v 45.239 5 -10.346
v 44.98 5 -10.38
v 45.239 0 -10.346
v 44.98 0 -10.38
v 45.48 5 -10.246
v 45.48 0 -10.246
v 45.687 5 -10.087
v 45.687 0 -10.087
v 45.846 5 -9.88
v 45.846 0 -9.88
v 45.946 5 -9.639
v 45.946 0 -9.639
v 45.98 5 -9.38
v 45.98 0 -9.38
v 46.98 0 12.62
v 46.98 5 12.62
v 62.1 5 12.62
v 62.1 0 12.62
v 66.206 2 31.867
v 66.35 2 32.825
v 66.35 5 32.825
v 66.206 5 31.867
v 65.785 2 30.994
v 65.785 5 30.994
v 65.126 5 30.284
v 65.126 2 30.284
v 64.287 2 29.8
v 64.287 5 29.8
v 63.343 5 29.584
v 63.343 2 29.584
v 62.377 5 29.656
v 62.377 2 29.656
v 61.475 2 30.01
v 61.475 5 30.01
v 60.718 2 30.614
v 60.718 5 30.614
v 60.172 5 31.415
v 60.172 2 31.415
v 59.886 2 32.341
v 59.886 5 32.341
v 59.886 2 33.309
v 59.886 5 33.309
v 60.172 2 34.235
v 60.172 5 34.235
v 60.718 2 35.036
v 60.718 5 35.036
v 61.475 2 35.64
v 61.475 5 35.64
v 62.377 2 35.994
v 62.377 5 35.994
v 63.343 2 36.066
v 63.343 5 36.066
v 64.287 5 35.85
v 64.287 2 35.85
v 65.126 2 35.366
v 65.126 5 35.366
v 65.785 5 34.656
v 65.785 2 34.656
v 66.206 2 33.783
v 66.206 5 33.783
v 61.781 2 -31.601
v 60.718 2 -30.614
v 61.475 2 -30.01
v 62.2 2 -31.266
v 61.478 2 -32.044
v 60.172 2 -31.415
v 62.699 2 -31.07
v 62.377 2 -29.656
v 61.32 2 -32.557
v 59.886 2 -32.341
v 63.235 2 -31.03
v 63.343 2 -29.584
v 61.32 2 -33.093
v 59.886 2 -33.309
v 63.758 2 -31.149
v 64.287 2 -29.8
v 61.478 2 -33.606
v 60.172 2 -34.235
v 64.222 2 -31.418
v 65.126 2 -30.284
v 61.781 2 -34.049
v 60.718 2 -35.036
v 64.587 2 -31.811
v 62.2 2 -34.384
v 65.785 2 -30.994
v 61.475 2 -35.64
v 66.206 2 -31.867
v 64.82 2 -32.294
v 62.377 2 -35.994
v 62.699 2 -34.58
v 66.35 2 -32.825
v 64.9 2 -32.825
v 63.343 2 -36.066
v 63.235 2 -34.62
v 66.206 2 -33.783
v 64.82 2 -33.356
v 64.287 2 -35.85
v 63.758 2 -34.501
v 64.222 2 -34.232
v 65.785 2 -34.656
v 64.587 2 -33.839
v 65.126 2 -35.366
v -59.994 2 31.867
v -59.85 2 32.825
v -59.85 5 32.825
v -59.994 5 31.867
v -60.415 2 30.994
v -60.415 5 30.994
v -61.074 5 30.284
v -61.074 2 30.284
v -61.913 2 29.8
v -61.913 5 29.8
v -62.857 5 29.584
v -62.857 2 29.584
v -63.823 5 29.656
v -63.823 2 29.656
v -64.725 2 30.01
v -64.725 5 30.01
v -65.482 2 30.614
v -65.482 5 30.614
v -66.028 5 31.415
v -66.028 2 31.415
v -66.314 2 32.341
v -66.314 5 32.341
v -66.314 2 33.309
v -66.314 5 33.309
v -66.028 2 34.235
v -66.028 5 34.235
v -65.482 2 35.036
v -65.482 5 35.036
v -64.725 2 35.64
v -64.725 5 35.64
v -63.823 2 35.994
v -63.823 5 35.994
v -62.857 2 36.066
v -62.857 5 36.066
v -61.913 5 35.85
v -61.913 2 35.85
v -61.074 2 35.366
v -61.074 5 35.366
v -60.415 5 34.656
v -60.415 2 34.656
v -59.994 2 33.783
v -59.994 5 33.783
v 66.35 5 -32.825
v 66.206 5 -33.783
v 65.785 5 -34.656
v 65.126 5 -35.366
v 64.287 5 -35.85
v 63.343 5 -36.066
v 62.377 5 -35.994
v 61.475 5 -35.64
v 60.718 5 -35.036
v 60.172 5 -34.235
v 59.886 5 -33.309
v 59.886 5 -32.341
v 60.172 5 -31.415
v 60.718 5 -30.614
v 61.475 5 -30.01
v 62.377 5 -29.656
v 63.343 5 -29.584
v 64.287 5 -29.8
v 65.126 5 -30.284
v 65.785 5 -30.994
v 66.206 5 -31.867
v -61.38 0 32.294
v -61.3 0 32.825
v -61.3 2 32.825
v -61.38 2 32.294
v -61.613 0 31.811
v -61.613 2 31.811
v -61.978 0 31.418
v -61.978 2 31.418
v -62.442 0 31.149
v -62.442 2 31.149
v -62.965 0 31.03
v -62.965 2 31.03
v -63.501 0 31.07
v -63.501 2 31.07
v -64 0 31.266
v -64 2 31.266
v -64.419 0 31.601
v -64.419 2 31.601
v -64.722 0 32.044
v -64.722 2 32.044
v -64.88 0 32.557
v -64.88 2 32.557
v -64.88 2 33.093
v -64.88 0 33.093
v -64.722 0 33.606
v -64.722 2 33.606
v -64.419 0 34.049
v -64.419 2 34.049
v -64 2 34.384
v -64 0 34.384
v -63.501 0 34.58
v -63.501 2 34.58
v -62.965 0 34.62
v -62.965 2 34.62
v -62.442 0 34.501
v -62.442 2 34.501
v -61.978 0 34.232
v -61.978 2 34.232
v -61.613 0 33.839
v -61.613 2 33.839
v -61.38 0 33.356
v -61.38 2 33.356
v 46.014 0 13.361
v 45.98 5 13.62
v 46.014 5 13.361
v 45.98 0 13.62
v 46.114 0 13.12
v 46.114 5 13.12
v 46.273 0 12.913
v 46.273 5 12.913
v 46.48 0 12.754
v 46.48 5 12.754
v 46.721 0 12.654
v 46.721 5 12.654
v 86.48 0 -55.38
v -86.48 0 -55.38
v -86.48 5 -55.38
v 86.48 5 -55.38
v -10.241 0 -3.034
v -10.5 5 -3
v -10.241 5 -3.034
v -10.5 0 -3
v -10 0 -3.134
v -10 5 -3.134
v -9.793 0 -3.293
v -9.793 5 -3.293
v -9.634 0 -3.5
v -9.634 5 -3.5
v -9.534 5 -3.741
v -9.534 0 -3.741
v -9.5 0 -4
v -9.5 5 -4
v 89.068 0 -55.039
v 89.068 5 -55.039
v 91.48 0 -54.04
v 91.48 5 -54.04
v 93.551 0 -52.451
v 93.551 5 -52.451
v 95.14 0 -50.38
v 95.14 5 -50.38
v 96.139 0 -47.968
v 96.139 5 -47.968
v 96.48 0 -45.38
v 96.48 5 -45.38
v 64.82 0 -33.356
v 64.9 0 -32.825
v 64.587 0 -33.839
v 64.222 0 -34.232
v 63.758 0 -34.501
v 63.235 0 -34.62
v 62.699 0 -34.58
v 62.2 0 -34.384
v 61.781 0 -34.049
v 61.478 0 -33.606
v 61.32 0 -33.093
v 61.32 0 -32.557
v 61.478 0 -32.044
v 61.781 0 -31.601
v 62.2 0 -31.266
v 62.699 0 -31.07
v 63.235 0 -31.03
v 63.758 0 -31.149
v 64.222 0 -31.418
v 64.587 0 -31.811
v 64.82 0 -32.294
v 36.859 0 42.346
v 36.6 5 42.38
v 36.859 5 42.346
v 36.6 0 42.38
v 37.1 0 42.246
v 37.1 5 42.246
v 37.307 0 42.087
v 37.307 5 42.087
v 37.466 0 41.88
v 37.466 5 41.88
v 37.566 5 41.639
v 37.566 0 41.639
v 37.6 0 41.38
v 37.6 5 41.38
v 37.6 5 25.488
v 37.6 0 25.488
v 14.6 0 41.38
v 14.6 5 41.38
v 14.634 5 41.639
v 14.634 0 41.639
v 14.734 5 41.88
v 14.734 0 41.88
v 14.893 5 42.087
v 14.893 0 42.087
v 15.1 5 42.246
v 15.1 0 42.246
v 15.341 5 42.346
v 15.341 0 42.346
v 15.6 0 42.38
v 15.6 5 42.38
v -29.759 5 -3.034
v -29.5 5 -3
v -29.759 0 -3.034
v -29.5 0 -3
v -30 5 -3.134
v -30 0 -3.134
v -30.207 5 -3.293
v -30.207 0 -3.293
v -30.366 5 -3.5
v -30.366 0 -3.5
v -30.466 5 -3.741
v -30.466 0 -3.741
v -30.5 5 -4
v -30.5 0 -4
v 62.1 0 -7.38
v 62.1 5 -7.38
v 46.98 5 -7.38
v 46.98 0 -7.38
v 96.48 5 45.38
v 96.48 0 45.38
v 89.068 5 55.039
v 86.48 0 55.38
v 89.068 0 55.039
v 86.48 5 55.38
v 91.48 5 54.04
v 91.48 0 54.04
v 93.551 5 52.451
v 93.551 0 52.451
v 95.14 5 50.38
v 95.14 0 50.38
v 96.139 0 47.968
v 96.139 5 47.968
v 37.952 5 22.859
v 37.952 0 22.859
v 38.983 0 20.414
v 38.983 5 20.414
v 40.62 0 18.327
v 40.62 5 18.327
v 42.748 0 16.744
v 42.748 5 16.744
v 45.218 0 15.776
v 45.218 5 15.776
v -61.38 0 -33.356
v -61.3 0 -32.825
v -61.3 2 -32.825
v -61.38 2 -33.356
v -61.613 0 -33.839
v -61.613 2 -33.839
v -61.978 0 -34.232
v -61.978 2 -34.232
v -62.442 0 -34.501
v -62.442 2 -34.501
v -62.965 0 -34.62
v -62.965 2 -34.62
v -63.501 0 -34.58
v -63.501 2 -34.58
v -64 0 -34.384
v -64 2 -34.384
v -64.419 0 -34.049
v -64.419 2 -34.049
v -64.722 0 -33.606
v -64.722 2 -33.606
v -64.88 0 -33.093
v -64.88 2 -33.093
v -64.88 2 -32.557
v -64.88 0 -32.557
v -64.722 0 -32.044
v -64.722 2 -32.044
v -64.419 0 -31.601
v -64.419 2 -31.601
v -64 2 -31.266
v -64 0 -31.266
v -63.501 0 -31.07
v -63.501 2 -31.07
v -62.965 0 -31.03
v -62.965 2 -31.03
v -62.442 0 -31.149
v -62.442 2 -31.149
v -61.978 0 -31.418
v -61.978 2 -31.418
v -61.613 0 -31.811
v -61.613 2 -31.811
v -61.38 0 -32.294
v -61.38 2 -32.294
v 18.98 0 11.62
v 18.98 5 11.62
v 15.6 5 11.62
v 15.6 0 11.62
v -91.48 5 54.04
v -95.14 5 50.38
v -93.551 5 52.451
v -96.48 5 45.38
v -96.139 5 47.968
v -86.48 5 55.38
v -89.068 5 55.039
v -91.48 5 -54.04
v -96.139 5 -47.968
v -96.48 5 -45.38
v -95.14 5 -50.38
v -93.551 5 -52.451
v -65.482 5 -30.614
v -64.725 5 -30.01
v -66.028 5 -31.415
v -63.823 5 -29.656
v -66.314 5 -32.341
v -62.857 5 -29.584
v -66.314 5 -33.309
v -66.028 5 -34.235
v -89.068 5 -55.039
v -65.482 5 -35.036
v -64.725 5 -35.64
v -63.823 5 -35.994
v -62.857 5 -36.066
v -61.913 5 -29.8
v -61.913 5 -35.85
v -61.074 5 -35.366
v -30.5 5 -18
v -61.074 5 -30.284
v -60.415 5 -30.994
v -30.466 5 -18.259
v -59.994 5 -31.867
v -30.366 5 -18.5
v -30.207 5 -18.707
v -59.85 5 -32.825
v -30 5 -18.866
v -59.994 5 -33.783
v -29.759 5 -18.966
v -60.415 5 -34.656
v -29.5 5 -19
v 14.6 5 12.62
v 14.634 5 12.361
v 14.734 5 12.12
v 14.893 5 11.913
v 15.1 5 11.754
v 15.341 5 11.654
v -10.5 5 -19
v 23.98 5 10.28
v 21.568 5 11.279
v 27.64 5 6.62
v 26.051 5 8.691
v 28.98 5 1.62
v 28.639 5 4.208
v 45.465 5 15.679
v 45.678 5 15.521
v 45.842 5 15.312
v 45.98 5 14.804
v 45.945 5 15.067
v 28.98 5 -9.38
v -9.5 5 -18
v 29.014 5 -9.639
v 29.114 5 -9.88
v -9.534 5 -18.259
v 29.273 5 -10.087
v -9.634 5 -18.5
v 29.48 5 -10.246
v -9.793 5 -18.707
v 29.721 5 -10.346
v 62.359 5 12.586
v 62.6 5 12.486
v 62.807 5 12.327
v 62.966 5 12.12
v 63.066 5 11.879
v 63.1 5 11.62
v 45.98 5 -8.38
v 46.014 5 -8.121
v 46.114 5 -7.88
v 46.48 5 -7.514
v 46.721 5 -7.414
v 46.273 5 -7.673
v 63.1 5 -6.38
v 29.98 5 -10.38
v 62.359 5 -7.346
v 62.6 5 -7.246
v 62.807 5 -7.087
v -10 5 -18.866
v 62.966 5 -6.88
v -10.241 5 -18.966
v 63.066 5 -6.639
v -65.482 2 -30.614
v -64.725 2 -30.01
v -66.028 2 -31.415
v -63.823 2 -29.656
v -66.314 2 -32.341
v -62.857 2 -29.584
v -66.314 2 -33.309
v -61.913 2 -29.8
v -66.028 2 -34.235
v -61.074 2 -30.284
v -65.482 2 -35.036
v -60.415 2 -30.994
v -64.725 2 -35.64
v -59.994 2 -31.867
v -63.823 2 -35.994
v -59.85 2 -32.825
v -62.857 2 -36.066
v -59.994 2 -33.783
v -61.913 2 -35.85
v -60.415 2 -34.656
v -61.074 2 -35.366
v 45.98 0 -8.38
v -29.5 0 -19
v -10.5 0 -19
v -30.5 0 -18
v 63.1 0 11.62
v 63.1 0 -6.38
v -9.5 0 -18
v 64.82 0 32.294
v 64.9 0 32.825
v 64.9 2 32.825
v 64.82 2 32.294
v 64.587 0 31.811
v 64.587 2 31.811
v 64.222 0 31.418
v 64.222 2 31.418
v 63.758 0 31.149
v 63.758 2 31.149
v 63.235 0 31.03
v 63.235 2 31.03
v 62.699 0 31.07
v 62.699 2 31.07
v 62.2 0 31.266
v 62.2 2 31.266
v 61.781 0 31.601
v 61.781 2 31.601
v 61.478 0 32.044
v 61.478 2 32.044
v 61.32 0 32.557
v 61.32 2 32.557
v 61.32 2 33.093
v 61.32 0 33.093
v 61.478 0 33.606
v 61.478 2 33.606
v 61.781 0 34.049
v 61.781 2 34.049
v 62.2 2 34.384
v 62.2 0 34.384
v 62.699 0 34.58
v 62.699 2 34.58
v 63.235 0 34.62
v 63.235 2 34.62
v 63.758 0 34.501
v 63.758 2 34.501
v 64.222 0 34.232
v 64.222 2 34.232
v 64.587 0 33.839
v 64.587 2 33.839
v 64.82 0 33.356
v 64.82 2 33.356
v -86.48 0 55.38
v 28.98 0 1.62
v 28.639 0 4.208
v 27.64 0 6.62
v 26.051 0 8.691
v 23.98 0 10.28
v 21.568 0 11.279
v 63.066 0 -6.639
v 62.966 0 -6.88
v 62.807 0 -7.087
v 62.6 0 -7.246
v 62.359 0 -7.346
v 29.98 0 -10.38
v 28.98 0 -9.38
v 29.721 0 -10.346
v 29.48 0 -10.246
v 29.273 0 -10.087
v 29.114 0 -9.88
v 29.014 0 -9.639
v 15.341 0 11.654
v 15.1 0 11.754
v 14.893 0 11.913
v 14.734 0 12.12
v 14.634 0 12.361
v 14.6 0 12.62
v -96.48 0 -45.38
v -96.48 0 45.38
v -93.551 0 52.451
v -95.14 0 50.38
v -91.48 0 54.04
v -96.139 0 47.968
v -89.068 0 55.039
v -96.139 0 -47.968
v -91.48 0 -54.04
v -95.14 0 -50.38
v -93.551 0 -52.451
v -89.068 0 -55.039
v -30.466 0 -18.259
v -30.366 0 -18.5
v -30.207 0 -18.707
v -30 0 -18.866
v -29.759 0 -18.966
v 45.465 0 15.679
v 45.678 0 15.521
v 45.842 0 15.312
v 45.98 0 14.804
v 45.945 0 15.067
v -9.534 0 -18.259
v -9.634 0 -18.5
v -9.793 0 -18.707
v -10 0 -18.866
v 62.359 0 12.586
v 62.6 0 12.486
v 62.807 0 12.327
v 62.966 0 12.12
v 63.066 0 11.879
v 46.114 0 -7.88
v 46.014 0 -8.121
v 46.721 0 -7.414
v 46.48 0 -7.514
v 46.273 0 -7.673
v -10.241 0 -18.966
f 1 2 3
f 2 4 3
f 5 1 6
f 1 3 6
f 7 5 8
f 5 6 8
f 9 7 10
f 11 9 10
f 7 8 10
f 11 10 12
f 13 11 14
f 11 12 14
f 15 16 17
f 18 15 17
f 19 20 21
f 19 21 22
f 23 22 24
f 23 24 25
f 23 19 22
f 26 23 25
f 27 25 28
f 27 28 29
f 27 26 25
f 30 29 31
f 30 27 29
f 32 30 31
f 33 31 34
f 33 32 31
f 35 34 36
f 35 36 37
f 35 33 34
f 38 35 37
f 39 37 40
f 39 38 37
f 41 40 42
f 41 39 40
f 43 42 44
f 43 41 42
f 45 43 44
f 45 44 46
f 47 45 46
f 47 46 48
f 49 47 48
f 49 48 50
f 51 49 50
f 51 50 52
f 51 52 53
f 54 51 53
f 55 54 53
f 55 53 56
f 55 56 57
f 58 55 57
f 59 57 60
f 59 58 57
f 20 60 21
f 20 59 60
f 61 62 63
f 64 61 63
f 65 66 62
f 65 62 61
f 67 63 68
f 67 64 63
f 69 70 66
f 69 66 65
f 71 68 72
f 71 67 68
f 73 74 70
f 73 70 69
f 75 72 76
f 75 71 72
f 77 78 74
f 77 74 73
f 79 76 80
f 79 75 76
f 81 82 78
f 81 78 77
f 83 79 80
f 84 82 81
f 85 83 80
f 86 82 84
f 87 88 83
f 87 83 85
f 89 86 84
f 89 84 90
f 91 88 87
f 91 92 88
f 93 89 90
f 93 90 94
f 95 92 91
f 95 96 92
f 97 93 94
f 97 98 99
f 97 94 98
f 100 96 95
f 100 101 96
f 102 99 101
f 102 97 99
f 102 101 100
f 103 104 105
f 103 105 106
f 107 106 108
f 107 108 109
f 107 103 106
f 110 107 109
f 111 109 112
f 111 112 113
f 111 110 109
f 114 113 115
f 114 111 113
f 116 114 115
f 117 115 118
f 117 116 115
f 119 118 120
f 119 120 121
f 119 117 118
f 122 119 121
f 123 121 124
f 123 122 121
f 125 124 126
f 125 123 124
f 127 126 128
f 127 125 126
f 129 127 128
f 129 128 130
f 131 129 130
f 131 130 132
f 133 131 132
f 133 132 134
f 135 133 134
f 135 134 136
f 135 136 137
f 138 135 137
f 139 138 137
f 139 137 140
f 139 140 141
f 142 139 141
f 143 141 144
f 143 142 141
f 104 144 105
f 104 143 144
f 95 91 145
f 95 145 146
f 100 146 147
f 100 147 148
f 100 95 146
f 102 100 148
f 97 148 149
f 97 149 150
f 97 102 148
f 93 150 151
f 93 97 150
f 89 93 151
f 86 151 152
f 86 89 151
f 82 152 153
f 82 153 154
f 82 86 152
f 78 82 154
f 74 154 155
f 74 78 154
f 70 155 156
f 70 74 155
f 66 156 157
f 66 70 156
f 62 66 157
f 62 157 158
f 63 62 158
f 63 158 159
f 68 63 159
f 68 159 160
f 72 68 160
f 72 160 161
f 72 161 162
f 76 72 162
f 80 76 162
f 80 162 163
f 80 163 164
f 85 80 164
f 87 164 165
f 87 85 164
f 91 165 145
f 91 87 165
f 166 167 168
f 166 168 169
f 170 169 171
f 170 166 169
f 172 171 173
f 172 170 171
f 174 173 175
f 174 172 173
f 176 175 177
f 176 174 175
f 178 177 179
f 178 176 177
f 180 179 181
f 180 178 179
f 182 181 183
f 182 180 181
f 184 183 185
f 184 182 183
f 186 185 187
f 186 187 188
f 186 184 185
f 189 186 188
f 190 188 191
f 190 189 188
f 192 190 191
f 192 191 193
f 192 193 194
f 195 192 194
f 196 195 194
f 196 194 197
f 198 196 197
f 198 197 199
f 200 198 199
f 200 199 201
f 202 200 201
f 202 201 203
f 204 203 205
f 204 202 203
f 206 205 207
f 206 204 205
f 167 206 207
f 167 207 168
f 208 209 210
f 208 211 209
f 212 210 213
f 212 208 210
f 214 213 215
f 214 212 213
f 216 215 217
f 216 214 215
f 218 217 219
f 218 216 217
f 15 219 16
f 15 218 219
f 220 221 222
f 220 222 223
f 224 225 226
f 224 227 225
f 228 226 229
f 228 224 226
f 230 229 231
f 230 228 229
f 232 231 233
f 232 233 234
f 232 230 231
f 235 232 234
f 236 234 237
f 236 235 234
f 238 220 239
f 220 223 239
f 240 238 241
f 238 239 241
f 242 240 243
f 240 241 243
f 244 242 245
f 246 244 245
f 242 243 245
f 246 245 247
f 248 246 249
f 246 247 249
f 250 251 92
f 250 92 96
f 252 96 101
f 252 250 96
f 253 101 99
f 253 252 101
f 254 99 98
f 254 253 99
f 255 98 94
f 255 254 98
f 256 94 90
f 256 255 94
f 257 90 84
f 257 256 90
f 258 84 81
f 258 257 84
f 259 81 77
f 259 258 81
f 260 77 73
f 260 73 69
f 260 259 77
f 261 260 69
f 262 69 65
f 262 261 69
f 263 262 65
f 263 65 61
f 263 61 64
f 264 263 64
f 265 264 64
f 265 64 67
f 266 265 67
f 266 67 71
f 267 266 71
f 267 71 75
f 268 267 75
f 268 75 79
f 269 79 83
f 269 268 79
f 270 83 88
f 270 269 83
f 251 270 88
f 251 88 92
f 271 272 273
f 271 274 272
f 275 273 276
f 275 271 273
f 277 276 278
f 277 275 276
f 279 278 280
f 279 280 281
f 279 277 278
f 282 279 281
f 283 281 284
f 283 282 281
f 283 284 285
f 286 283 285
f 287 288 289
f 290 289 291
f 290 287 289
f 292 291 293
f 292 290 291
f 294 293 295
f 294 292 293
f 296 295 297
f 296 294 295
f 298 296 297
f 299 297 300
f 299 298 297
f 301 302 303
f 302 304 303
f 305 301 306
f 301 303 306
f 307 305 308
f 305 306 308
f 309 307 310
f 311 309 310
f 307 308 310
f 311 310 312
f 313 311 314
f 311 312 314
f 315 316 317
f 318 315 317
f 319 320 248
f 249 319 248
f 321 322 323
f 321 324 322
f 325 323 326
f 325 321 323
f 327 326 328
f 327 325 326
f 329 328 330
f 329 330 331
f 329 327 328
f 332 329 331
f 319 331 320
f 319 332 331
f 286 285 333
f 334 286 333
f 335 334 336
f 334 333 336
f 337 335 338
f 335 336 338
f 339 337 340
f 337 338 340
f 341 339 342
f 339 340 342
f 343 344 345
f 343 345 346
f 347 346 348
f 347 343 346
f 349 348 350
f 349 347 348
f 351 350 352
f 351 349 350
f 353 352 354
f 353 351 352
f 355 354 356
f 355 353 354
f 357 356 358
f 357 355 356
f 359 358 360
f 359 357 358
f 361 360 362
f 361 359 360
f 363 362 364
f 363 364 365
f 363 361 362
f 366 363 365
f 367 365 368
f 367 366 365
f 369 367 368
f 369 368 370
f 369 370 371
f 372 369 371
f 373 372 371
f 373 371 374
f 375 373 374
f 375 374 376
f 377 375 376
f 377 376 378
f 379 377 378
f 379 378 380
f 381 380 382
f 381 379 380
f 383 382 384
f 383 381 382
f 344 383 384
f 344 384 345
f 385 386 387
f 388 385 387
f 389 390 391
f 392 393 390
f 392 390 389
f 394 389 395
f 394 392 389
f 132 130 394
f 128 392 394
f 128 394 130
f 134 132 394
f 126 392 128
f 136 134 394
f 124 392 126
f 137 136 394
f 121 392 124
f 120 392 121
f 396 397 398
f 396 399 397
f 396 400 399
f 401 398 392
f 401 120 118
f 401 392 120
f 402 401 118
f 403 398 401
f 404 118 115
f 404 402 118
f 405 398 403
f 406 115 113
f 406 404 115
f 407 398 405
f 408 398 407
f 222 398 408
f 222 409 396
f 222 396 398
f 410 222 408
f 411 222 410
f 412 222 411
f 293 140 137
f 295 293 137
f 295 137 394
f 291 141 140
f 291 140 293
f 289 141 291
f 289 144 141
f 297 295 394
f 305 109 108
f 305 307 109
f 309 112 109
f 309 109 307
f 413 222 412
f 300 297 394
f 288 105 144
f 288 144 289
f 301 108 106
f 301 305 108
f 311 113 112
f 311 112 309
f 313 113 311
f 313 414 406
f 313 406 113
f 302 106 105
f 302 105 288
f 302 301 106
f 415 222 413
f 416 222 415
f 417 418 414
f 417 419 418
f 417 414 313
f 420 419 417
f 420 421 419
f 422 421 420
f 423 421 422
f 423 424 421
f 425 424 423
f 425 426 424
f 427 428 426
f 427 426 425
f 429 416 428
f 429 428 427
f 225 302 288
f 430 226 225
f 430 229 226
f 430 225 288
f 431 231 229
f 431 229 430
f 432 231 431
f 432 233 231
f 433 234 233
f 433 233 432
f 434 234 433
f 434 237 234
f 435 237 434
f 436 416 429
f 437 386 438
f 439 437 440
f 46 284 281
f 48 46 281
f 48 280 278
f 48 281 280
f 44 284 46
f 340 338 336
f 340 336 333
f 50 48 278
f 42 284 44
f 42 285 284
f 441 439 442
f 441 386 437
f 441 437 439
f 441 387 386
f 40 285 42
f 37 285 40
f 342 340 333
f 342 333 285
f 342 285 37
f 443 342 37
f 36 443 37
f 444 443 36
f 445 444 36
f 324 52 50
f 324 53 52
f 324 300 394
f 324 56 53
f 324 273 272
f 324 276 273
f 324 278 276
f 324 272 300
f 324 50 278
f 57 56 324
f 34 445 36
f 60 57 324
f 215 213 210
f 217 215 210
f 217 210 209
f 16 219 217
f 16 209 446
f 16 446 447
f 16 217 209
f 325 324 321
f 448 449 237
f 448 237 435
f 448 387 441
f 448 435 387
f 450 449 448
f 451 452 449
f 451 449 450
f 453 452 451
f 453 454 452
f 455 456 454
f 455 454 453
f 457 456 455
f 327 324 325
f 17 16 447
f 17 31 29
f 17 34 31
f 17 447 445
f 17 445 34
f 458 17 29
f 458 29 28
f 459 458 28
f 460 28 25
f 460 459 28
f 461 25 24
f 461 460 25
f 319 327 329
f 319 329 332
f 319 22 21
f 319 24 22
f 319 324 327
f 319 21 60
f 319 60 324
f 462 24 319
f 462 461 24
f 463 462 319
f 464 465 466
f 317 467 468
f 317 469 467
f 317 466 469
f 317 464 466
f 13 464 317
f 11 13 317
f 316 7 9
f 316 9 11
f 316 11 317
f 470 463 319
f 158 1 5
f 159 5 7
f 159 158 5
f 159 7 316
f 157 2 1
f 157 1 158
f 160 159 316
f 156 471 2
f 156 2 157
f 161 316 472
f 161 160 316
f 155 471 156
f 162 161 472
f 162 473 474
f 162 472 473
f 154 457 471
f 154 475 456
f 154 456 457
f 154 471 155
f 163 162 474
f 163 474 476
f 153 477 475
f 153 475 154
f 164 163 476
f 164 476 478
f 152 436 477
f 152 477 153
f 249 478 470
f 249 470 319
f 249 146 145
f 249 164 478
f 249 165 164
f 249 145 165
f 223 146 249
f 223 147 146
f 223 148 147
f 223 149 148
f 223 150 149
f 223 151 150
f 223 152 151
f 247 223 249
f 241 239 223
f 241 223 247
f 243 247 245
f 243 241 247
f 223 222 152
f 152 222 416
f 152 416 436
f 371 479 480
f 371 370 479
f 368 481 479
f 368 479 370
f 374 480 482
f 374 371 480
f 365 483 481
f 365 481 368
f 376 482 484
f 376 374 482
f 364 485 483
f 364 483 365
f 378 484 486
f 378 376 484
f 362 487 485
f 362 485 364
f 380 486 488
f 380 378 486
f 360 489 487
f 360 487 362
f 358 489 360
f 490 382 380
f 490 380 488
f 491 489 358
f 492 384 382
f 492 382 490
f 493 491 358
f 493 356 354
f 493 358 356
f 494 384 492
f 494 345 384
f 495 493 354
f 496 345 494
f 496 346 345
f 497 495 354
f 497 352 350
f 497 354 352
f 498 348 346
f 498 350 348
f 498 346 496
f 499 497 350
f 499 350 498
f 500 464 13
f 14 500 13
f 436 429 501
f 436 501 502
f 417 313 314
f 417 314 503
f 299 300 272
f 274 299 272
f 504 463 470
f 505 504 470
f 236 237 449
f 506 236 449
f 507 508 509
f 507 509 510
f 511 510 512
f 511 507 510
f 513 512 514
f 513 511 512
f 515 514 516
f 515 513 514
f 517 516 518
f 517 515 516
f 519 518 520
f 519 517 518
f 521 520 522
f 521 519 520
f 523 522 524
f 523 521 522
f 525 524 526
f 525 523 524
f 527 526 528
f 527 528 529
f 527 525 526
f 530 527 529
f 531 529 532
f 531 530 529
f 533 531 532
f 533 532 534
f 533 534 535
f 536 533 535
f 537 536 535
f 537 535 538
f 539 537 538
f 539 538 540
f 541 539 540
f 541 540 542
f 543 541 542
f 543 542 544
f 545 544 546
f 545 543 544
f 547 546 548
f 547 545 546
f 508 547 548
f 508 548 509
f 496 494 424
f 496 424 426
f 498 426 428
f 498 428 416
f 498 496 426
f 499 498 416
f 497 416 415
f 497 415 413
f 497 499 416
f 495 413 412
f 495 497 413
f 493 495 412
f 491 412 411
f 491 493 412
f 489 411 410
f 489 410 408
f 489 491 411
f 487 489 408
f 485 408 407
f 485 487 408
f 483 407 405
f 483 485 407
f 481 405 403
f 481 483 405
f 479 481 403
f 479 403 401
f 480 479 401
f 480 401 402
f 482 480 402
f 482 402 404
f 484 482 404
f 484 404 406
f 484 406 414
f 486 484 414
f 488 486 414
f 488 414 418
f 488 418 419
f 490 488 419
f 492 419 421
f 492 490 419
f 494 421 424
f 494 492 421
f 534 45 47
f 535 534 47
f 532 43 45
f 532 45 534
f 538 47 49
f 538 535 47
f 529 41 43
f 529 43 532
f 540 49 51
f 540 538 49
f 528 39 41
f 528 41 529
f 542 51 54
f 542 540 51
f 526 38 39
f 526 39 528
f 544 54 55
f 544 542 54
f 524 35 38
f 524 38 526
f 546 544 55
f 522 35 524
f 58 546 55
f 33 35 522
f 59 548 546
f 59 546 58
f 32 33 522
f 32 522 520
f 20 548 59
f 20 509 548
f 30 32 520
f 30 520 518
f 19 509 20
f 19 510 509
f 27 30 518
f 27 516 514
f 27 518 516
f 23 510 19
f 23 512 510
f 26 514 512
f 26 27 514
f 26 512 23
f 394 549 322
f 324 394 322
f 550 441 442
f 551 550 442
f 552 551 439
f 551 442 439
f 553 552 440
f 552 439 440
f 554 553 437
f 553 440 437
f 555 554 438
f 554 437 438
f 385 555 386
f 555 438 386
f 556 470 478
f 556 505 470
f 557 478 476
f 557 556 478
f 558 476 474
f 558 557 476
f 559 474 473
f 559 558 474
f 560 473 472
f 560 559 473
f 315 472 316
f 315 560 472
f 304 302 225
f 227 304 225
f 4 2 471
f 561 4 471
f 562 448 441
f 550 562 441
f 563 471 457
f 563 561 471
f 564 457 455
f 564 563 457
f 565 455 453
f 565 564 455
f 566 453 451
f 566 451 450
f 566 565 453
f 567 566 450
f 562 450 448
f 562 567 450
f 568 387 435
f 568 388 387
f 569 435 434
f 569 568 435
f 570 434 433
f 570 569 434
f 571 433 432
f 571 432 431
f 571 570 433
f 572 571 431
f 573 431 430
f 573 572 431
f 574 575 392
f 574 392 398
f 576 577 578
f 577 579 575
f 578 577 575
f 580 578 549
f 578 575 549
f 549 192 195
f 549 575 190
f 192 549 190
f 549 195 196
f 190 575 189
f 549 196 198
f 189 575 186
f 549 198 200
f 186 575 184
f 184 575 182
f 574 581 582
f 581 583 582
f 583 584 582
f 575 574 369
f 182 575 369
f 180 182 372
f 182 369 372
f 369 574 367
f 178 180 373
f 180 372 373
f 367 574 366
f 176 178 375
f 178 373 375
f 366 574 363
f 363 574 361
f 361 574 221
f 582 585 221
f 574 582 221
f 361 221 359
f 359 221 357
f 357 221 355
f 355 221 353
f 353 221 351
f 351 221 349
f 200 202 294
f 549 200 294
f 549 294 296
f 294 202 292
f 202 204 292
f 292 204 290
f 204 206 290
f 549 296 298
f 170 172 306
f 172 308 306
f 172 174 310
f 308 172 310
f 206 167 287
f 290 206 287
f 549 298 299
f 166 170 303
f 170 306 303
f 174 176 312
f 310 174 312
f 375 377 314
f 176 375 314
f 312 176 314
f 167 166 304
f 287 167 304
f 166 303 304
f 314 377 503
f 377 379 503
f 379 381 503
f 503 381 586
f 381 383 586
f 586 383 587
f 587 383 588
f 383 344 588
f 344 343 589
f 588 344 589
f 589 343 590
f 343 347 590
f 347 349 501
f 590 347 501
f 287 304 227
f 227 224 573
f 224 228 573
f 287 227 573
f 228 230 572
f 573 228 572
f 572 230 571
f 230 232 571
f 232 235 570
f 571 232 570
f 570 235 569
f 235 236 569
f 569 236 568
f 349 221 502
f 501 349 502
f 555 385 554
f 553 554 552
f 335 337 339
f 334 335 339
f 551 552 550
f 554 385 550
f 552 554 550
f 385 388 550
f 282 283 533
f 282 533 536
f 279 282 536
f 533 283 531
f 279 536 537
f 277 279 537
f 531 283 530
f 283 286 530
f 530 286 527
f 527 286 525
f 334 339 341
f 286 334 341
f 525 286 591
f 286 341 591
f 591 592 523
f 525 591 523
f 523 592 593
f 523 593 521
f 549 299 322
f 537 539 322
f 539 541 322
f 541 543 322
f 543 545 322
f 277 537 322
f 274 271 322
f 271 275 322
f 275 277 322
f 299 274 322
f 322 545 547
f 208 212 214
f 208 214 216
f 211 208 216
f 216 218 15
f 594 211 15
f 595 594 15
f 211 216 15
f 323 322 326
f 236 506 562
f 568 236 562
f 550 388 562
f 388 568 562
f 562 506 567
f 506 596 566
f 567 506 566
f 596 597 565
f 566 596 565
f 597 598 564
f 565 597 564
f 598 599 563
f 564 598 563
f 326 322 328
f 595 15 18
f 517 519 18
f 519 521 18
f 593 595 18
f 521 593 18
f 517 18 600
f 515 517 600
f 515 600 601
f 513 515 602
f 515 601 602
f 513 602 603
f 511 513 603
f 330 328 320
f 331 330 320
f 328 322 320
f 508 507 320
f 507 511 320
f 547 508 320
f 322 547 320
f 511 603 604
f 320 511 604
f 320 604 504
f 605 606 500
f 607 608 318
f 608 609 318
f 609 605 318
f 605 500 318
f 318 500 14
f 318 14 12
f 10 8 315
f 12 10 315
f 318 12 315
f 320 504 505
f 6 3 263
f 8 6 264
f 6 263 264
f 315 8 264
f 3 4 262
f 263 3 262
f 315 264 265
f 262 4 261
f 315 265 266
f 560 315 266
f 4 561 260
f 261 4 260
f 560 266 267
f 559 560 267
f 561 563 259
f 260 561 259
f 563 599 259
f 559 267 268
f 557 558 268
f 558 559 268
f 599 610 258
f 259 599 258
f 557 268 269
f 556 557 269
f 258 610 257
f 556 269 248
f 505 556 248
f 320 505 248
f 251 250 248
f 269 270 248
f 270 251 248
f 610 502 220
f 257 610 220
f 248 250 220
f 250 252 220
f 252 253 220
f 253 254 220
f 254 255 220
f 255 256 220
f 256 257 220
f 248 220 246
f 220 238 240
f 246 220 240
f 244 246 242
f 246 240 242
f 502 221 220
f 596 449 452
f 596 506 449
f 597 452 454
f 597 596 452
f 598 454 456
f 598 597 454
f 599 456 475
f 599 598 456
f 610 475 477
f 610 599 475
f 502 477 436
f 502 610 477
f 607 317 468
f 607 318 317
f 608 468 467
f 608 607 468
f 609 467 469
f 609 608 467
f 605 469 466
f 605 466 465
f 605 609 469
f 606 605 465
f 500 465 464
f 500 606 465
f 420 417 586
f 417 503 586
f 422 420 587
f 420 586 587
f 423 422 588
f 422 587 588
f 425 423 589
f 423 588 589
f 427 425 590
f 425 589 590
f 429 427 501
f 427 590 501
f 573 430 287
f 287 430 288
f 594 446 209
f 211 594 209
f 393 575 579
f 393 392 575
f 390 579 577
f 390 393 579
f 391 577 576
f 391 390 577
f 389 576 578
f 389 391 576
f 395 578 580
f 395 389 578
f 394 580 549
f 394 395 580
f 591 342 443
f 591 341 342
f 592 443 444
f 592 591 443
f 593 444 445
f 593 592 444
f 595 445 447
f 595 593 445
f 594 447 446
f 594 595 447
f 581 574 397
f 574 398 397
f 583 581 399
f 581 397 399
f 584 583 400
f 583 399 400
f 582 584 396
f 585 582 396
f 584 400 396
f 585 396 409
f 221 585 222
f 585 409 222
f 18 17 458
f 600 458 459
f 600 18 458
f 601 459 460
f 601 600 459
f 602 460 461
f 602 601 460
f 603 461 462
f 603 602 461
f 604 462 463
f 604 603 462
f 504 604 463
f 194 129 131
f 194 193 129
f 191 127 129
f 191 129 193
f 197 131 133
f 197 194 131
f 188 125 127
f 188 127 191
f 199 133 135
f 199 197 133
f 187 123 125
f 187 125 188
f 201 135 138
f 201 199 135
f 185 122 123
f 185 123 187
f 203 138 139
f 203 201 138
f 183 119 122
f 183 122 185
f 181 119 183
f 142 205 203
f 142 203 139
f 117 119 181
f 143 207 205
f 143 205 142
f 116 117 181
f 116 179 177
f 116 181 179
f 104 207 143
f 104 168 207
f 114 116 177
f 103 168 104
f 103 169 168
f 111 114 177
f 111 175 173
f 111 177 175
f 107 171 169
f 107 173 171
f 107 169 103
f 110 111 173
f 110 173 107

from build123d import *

# Parameters (mm, degrees)
SKETCH1_W                      = 192.96
SKETCH1_H                      = 110.76
BOSS_EXTRUDE1_DEPTH            = 5
CBORE_START                    = 2
CBORE_FOR_M3_SHCS1_OUTLINE_R   = 3.25
CBORE_FOR_M3_SHCS1_DEPTH       = 3
CBORE_FOR_M3_SHCS1_2_OUTLINE_R = 1.8
CBORE_FOR_M3_SHCS1_2_DEPTH     = 2
SKETCH9_W                      = 21
SKETCH9_H                      = 16
CUT_EXTRUDE1_DEPTH             = 112.356790543
FILLET1_R                      = 10
FILLET2_R                      = 10
FILLET3_R                      = 1


# Read off the part's stored shape, not the designer's step: CBORE for M3 SHCS1
with BuildPart() as part:
    # Sketch1 → Boss-Extrude1 (new body)
    with BuildSketch(Plane(origin=(0, 0, 0), x_dir=(1, 0, 0), z_dir=(0, 1, 0))):
        Rectangle(SKETCH1_W, SKETCH1_H)
    extrude(amount=BOSS_EXTRUDE1_DEPTH)

    # CBORE for M3 SHCS1 outline → CBORE for M3 SHCS1 (cut)
    with BuildSketch(Plane(origin=(0, 0, 0), x_dir=(1, 0, 0), z_dir=(0, 1, 0)).offset(CBORE_START)):
        with Locations((63.1, -32.825)):
            Circle(CBORE_FOR_M3_SHCS1_OUTLINE_R)
        with Locations((-63.1, 32.825)):
            Circle(CBORE_FOR_M3_SHCS1_OUTLINE_R)
        with Locations((-63.1, -32.825)):
            Circle(CBORE_FOR_M3_SHCS1_OUTLINE_R)
        with Locations((63.1, 32.825)):
            Circle(CBORE_FOR_M3_SHCS1_OUTLINE_R)
    extrude(amount=CBORE_FOR_M3_SHCS1_DEPTH, mode=Mode.SUBTRACT)

    # CBORE for M3 SHCS1 2 outline → CBORE for M3 SHCS1 2 (cut)
    with BuildSketch(Plane(origin=(0, 0, 0), x_dir=(1, 0, 0), z_dir=(0, 1, 0))):
        with Locations((63.1, -32.825)):
            Circle(CBORE_FOR_M3_SHCS1_2_OUTLINE_R)
        with Locations((-63.1, 32.825)):
            Circle(CBORE_FOR_M3_SHCS1_2_OUTLINE_R)
        with Locations((-63.1, -32.825)):
            Circle(CBORE_FOR_M3_SHCS1_2_OUTLINE_R)
        with Locations((63.1, 32.825)):
            Circle(CBORE_FOR_M3_SHCS1_2_OUTLINE_R)
    extrude(amount=CBORE_FOR_M3_SHCS1_2_DEPTH, mode=Mode.SUBTRACT)

    # Sketch9 → Cut-Extrude1 (cut, through all)
    with BuildSketch(Plane(origin=(0, 5, 0), x_dir=(1, 0, 0), z_dir=(0, 1, 0))):
        Polygon((45.98, 10.38), (28.98, 10.38), (28.98, -11.62), (14.6, -11.62), (14.6, -42.38), (37.6, -42.38), (37.6, -15.62), (45.98, -15.62), (45.98, -12.62), (63.1, -12.62), (63.1, 7.38), (45.98, 7.38), align=None)
        with Locations((-20, 11)):
            Rectangle(SKETCH9_W, SKETCH9_H)
    extrude(amount=-CUT_EXTRUDE1_DEPTH, mode=Mode.SUBTRACT)

    # Fillet1
    fillet1_edges = [part.edges().sort_by_distance(p)[0] for p in [
        (-96.48, 2.5, -55.38),
        (96.48, 2.5, -55.38),
        (96.48, 2.5, 55.38),
        (-96.48, 2.5, 55.38),
    ]]
    fillet(fillet1_edges, radius=FILLET1_R)

    # Fillet2
    # the kernel refuses this fillet: 10 mm, written as the material it takes off along each edge
    with BuildSketch(Plane(origin=(37.6, 29.669768949, 15.62), x_dir=(1, 0, 0), z_dir=(0, -1, 0))) as fillet2_piece_1:
        with BuildLine():
            CenterArc((10, 9.86790758), FILLET2_R, 180, 80.676997523)
            Line((0, 9.86790758), (-0.2, 9.86790758))
            Line((-0.2, 9.86790758), (-0.2, 0))
            Line((-0.2, 0), (0, -0.2))
            ThreePointArc((0, -0.2), (4.19, -0.2), (8.3476, -0.197358152))
            Line((8.3476, -0.197358152), (8.38, 0))
        make_face()
    extrude(amount=54.339537898, mode=Mode.SUBTRACT)
    with BuildSketch(Plane(origin=(28.98, 30, 11.62), x_dir=(-1, 0, 0), z_dir=(0, -1, 0))) as fillet2_piece_2:
        with BuildLine():
            CenterArc((FILLET2_R, FILLET2_R), FILLET2_R, 180, 90)
            Line((0, FILLET2_R), (-FILLET2_R * 0.02, FILLET2_R))
            Line((-FILLET2_R * 0.02, FILLET2_R), (-FILLET2_R * 0.02, -FILLET2_R * 0.02))
            Line((-FILLET2_R * 0.02, -FILLET2_R * 0.02), (FILLET2_R, -FILLET2_R * 0.02))
            Line((FILLET2_R, -FILLET2_R * 0.02), (FILLET2_R, 0))
        make_face()
    extrude(amount=55, mode=Mode.SUBTRACT)

    # Fillet3
    fillet3_edges = [part.edges().sort_by_distance(p)[0] for p in [
        (-30.5, 2.5, -3),
        (-30.5, 2.5, -19),
        (-9.5, 2.5, -19),
        (-9.5, 2.5, -3),
        (45.98, 2.5, -10.38),
        (45.98, 2.5, -7.38),
        (63.1, 2.5, -7.38),
        (63.1, 2.5, 12.62),
        (45.98, 2.5, 12.62),
        (45.98, 2.5, 15.62),
        (37.6, 2.5, 42.38),
        (14.6, 2.5, 42.38),
        (14.6, 2.5, 11.62),
        (28.98, 2.5, -10.38),
    ]]
    fillet(fillet3_edges, radius=FILLET3_R)


solid = part.part
